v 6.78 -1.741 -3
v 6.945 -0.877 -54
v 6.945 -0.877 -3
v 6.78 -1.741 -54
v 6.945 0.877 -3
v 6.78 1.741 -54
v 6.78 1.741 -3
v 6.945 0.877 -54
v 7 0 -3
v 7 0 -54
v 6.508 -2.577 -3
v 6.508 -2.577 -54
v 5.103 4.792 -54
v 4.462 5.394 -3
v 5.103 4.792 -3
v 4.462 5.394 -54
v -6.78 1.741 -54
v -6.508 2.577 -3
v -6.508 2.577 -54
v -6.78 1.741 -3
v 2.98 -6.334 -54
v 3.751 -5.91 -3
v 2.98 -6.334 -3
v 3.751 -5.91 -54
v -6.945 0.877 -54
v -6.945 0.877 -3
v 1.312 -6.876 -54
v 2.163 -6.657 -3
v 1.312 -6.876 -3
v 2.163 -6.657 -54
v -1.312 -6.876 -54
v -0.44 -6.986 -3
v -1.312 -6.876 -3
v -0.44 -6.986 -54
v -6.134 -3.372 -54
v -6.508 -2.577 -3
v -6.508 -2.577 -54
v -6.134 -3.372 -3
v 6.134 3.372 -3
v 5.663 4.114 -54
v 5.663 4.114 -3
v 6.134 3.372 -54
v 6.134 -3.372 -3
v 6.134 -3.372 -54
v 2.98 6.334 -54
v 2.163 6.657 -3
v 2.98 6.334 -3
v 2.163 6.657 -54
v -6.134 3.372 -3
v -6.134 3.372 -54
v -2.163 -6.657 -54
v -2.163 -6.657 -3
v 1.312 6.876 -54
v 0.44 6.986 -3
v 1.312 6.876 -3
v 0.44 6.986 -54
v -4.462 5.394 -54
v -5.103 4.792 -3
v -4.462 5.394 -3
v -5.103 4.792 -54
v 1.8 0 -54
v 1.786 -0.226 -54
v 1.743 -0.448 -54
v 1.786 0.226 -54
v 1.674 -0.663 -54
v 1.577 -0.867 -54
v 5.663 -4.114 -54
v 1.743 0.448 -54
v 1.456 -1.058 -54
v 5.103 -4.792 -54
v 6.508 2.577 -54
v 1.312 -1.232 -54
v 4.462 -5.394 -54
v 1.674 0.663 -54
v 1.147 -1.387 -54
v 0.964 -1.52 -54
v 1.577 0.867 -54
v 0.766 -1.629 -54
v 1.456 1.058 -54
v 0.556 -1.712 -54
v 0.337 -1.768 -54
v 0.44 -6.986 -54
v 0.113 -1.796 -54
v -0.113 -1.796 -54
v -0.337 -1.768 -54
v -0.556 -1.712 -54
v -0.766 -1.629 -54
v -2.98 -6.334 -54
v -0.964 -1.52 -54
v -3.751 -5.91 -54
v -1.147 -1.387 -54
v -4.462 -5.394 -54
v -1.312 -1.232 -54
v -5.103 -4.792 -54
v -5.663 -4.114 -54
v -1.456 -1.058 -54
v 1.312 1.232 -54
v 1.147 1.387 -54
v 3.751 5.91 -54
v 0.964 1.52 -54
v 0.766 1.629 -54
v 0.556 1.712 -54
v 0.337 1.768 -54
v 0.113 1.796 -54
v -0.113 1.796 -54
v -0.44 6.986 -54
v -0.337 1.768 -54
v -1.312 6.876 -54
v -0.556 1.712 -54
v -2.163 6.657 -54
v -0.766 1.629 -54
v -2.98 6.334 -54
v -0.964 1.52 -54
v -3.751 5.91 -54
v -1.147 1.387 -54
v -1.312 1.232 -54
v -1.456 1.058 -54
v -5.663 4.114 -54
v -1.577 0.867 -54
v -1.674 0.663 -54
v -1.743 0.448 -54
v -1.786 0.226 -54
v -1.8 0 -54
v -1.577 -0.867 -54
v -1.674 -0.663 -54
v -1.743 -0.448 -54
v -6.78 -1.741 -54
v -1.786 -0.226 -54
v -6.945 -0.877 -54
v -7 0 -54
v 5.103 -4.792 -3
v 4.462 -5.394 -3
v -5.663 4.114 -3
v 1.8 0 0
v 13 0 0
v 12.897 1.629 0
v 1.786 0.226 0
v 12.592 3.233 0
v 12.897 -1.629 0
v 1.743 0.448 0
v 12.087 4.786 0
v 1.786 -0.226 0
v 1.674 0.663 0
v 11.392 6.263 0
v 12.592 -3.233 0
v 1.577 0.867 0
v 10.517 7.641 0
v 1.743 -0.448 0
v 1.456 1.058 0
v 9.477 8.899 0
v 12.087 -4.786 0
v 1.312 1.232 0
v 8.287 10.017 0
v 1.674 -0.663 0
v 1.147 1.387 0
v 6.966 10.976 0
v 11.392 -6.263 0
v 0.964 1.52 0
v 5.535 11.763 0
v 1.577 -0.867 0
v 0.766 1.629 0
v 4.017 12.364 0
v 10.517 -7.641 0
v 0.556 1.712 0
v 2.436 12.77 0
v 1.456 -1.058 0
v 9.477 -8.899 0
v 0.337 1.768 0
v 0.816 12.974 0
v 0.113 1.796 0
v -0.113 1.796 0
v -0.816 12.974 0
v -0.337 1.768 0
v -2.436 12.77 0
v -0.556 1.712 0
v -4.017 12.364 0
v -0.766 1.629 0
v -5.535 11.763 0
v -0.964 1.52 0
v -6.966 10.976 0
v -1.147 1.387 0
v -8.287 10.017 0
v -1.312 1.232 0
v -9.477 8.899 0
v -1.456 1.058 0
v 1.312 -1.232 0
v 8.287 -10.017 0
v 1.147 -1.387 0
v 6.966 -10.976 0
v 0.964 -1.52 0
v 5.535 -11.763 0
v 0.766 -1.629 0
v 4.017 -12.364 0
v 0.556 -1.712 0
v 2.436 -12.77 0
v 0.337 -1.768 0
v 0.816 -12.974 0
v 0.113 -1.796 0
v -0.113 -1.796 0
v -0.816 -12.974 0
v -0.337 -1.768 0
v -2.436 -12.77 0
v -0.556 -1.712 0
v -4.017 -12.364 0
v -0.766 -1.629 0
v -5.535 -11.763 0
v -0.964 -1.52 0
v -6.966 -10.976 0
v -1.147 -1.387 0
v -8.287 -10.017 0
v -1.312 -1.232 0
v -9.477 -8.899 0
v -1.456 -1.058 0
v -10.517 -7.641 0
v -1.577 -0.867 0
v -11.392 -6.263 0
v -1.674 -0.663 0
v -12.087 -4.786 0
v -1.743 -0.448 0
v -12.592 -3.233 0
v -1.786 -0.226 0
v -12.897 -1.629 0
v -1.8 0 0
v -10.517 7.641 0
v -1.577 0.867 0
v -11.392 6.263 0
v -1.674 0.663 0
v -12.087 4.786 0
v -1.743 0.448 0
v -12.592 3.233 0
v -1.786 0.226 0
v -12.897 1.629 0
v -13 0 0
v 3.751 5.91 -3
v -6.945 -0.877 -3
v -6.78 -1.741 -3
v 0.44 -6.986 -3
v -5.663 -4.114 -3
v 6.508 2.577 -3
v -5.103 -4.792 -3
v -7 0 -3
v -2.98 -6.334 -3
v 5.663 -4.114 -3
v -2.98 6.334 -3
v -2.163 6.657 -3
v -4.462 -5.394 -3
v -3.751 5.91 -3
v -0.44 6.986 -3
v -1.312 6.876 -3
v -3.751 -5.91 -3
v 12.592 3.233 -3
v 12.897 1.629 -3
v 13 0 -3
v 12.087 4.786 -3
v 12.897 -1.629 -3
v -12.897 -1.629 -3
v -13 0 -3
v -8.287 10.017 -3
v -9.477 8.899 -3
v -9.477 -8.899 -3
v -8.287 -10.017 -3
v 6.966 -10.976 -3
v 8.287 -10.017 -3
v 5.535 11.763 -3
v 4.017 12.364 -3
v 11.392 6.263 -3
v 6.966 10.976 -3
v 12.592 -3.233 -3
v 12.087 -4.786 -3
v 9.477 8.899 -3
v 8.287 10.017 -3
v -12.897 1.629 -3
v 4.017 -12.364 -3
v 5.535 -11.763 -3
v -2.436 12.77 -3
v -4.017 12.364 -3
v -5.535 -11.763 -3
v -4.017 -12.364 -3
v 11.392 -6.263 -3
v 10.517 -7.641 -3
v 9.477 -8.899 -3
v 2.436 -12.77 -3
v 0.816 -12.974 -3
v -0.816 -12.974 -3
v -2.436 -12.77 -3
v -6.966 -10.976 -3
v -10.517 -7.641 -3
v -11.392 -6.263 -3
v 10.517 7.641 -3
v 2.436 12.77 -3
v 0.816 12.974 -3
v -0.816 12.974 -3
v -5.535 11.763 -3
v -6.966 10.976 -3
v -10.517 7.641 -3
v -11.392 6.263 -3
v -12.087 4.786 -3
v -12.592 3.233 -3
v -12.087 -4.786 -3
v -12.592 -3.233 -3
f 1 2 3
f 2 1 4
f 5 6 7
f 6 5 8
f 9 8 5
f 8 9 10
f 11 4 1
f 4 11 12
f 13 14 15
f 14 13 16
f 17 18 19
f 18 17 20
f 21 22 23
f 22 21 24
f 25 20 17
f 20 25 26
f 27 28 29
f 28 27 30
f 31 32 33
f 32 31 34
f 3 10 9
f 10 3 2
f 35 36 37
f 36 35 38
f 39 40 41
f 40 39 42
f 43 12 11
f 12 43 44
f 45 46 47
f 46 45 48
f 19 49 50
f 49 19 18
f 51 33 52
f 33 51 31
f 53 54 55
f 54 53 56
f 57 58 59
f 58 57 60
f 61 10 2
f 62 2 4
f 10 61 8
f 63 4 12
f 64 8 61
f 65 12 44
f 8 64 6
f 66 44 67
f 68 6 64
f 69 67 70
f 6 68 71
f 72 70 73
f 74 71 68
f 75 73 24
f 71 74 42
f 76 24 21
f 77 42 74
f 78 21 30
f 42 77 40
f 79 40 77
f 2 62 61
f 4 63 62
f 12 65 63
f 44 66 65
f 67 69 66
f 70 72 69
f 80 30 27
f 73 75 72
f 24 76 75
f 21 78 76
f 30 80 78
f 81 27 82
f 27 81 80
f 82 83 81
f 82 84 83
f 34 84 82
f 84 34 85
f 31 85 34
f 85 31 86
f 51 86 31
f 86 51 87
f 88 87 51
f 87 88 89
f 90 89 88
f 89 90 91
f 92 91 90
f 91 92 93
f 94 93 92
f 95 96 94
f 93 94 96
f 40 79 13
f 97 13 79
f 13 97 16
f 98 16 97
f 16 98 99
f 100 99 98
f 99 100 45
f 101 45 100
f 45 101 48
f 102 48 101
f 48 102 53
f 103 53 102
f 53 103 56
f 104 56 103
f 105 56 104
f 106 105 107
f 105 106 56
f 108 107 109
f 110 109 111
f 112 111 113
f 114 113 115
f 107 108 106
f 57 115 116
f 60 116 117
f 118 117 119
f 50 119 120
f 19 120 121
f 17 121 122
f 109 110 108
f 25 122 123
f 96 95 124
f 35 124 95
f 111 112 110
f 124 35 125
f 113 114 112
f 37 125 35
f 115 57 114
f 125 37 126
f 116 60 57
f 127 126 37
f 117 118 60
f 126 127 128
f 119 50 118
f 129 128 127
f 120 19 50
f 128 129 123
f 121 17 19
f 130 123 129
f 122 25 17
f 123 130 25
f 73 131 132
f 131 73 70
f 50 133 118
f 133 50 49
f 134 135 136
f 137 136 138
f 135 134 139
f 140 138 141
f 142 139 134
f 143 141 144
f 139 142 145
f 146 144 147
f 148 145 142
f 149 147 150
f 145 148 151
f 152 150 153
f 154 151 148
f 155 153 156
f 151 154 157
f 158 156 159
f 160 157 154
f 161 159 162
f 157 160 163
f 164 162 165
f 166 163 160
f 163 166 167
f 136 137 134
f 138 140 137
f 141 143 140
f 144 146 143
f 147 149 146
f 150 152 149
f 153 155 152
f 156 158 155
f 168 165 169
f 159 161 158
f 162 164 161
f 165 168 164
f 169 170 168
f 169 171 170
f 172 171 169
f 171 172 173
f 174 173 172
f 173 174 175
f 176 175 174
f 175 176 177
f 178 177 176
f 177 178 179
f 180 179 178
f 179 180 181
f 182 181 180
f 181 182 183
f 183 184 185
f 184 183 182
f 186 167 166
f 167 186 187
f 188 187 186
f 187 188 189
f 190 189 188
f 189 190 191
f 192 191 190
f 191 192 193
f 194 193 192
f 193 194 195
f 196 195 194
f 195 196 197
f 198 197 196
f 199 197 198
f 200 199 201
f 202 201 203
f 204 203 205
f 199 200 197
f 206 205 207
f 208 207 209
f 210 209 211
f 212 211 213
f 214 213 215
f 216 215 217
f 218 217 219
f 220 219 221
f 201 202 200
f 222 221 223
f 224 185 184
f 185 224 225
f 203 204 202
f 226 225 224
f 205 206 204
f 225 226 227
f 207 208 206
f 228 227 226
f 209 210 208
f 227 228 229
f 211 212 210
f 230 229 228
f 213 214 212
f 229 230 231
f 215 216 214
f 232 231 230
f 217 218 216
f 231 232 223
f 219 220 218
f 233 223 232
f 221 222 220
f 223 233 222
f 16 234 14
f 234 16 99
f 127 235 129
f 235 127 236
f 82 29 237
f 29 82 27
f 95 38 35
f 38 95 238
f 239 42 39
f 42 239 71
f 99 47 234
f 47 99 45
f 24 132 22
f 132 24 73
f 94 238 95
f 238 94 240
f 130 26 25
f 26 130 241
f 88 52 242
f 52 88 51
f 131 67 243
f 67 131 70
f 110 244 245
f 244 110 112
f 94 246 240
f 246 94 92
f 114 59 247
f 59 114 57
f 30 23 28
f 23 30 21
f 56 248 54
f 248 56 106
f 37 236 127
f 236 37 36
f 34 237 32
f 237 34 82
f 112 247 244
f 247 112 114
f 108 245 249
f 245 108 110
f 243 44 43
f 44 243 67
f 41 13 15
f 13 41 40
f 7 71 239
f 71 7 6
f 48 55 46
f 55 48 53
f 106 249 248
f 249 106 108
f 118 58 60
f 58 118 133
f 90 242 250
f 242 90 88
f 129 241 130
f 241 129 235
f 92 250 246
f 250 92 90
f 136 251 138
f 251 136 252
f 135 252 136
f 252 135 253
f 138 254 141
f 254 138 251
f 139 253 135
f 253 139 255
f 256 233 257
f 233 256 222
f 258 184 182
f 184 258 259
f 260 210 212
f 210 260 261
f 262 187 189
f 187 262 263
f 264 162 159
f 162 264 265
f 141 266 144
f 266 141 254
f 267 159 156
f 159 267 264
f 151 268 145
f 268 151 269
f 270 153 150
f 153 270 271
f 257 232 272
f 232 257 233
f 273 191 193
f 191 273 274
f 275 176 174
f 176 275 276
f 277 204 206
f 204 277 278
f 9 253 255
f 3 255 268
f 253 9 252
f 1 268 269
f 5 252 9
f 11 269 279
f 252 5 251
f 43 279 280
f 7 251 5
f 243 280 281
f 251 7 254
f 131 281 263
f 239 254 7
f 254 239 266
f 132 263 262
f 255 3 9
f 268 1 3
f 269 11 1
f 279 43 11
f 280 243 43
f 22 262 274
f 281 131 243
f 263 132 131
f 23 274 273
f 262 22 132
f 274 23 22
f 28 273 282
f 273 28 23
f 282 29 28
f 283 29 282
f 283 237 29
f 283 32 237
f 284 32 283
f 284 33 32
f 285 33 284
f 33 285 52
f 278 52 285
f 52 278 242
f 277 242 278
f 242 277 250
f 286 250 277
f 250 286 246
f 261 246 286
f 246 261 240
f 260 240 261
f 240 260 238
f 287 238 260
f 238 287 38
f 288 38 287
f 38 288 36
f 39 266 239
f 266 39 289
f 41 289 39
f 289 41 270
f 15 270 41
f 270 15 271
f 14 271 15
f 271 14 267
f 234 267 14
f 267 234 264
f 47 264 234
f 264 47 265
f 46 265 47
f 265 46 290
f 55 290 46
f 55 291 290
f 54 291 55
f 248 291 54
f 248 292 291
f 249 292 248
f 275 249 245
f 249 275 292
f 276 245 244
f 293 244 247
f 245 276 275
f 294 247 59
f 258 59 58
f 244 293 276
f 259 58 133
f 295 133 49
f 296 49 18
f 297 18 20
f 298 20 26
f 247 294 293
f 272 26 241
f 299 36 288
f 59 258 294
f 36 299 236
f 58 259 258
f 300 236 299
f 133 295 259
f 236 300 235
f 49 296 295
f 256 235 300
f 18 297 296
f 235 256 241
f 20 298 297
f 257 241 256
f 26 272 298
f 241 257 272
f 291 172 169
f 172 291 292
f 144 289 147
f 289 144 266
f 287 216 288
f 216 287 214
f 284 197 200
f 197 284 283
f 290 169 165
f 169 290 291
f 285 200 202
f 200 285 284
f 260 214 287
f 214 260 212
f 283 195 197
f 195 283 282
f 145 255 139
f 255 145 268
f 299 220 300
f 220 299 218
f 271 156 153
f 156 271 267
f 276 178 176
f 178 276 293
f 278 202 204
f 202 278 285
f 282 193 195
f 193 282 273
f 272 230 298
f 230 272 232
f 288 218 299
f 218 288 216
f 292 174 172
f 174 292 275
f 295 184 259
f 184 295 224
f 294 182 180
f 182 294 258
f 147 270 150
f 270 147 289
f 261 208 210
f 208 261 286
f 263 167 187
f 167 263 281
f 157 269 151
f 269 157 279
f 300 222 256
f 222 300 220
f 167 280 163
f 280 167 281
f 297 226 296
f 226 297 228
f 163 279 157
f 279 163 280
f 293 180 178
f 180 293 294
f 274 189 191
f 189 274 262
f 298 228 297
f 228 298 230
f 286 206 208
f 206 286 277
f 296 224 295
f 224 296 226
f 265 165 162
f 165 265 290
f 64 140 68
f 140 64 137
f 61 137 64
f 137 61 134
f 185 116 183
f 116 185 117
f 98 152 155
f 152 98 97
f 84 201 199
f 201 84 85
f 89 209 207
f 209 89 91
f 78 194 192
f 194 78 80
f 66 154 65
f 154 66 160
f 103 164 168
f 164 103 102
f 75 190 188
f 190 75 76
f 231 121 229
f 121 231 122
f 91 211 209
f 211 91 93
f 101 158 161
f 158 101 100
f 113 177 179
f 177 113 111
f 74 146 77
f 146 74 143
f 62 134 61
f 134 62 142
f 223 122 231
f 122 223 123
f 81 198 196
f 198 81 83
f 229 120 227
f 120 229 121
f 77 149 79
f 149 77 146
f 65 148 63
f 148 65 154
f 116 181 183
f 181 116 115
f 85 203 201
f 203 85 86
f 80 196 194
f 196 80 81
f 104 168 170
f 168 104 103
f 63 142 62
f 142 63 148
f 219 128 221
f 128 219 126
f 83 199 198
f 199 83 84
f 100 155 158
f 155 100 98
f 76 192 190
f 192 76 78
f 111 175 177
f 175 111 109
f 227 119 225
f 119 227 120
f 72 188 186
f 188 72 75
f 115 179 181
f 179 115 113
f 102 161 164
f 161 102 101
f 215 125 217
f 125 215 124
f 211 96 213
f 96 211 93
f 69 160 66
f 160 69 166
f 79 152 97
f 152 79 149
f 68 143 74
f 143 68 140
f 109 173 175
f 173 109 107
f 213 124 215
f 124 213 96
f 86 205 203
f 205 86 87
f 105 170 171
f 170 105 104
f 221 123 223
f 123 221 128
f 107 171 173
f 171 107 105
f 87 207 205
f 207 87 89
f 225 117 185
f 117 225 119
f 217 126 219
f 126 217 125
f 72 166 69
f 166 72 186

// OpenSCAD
$fn = 50;


difference() {
	union() {
		translate(v = [0, 0, -54.0000000000]) {
			cylinder(h = 54, r = 7.0000000000);
		}
		translate(v = [0, 0, -3.0000000000]) {
			cylinder(h = 3, r = 13.0000000000);
		}
	}
	union() {
		#translate(v = [0, 0, -54]) {
			cylinder(h = 54, r = 1.8000000000);
		}
	}
}
